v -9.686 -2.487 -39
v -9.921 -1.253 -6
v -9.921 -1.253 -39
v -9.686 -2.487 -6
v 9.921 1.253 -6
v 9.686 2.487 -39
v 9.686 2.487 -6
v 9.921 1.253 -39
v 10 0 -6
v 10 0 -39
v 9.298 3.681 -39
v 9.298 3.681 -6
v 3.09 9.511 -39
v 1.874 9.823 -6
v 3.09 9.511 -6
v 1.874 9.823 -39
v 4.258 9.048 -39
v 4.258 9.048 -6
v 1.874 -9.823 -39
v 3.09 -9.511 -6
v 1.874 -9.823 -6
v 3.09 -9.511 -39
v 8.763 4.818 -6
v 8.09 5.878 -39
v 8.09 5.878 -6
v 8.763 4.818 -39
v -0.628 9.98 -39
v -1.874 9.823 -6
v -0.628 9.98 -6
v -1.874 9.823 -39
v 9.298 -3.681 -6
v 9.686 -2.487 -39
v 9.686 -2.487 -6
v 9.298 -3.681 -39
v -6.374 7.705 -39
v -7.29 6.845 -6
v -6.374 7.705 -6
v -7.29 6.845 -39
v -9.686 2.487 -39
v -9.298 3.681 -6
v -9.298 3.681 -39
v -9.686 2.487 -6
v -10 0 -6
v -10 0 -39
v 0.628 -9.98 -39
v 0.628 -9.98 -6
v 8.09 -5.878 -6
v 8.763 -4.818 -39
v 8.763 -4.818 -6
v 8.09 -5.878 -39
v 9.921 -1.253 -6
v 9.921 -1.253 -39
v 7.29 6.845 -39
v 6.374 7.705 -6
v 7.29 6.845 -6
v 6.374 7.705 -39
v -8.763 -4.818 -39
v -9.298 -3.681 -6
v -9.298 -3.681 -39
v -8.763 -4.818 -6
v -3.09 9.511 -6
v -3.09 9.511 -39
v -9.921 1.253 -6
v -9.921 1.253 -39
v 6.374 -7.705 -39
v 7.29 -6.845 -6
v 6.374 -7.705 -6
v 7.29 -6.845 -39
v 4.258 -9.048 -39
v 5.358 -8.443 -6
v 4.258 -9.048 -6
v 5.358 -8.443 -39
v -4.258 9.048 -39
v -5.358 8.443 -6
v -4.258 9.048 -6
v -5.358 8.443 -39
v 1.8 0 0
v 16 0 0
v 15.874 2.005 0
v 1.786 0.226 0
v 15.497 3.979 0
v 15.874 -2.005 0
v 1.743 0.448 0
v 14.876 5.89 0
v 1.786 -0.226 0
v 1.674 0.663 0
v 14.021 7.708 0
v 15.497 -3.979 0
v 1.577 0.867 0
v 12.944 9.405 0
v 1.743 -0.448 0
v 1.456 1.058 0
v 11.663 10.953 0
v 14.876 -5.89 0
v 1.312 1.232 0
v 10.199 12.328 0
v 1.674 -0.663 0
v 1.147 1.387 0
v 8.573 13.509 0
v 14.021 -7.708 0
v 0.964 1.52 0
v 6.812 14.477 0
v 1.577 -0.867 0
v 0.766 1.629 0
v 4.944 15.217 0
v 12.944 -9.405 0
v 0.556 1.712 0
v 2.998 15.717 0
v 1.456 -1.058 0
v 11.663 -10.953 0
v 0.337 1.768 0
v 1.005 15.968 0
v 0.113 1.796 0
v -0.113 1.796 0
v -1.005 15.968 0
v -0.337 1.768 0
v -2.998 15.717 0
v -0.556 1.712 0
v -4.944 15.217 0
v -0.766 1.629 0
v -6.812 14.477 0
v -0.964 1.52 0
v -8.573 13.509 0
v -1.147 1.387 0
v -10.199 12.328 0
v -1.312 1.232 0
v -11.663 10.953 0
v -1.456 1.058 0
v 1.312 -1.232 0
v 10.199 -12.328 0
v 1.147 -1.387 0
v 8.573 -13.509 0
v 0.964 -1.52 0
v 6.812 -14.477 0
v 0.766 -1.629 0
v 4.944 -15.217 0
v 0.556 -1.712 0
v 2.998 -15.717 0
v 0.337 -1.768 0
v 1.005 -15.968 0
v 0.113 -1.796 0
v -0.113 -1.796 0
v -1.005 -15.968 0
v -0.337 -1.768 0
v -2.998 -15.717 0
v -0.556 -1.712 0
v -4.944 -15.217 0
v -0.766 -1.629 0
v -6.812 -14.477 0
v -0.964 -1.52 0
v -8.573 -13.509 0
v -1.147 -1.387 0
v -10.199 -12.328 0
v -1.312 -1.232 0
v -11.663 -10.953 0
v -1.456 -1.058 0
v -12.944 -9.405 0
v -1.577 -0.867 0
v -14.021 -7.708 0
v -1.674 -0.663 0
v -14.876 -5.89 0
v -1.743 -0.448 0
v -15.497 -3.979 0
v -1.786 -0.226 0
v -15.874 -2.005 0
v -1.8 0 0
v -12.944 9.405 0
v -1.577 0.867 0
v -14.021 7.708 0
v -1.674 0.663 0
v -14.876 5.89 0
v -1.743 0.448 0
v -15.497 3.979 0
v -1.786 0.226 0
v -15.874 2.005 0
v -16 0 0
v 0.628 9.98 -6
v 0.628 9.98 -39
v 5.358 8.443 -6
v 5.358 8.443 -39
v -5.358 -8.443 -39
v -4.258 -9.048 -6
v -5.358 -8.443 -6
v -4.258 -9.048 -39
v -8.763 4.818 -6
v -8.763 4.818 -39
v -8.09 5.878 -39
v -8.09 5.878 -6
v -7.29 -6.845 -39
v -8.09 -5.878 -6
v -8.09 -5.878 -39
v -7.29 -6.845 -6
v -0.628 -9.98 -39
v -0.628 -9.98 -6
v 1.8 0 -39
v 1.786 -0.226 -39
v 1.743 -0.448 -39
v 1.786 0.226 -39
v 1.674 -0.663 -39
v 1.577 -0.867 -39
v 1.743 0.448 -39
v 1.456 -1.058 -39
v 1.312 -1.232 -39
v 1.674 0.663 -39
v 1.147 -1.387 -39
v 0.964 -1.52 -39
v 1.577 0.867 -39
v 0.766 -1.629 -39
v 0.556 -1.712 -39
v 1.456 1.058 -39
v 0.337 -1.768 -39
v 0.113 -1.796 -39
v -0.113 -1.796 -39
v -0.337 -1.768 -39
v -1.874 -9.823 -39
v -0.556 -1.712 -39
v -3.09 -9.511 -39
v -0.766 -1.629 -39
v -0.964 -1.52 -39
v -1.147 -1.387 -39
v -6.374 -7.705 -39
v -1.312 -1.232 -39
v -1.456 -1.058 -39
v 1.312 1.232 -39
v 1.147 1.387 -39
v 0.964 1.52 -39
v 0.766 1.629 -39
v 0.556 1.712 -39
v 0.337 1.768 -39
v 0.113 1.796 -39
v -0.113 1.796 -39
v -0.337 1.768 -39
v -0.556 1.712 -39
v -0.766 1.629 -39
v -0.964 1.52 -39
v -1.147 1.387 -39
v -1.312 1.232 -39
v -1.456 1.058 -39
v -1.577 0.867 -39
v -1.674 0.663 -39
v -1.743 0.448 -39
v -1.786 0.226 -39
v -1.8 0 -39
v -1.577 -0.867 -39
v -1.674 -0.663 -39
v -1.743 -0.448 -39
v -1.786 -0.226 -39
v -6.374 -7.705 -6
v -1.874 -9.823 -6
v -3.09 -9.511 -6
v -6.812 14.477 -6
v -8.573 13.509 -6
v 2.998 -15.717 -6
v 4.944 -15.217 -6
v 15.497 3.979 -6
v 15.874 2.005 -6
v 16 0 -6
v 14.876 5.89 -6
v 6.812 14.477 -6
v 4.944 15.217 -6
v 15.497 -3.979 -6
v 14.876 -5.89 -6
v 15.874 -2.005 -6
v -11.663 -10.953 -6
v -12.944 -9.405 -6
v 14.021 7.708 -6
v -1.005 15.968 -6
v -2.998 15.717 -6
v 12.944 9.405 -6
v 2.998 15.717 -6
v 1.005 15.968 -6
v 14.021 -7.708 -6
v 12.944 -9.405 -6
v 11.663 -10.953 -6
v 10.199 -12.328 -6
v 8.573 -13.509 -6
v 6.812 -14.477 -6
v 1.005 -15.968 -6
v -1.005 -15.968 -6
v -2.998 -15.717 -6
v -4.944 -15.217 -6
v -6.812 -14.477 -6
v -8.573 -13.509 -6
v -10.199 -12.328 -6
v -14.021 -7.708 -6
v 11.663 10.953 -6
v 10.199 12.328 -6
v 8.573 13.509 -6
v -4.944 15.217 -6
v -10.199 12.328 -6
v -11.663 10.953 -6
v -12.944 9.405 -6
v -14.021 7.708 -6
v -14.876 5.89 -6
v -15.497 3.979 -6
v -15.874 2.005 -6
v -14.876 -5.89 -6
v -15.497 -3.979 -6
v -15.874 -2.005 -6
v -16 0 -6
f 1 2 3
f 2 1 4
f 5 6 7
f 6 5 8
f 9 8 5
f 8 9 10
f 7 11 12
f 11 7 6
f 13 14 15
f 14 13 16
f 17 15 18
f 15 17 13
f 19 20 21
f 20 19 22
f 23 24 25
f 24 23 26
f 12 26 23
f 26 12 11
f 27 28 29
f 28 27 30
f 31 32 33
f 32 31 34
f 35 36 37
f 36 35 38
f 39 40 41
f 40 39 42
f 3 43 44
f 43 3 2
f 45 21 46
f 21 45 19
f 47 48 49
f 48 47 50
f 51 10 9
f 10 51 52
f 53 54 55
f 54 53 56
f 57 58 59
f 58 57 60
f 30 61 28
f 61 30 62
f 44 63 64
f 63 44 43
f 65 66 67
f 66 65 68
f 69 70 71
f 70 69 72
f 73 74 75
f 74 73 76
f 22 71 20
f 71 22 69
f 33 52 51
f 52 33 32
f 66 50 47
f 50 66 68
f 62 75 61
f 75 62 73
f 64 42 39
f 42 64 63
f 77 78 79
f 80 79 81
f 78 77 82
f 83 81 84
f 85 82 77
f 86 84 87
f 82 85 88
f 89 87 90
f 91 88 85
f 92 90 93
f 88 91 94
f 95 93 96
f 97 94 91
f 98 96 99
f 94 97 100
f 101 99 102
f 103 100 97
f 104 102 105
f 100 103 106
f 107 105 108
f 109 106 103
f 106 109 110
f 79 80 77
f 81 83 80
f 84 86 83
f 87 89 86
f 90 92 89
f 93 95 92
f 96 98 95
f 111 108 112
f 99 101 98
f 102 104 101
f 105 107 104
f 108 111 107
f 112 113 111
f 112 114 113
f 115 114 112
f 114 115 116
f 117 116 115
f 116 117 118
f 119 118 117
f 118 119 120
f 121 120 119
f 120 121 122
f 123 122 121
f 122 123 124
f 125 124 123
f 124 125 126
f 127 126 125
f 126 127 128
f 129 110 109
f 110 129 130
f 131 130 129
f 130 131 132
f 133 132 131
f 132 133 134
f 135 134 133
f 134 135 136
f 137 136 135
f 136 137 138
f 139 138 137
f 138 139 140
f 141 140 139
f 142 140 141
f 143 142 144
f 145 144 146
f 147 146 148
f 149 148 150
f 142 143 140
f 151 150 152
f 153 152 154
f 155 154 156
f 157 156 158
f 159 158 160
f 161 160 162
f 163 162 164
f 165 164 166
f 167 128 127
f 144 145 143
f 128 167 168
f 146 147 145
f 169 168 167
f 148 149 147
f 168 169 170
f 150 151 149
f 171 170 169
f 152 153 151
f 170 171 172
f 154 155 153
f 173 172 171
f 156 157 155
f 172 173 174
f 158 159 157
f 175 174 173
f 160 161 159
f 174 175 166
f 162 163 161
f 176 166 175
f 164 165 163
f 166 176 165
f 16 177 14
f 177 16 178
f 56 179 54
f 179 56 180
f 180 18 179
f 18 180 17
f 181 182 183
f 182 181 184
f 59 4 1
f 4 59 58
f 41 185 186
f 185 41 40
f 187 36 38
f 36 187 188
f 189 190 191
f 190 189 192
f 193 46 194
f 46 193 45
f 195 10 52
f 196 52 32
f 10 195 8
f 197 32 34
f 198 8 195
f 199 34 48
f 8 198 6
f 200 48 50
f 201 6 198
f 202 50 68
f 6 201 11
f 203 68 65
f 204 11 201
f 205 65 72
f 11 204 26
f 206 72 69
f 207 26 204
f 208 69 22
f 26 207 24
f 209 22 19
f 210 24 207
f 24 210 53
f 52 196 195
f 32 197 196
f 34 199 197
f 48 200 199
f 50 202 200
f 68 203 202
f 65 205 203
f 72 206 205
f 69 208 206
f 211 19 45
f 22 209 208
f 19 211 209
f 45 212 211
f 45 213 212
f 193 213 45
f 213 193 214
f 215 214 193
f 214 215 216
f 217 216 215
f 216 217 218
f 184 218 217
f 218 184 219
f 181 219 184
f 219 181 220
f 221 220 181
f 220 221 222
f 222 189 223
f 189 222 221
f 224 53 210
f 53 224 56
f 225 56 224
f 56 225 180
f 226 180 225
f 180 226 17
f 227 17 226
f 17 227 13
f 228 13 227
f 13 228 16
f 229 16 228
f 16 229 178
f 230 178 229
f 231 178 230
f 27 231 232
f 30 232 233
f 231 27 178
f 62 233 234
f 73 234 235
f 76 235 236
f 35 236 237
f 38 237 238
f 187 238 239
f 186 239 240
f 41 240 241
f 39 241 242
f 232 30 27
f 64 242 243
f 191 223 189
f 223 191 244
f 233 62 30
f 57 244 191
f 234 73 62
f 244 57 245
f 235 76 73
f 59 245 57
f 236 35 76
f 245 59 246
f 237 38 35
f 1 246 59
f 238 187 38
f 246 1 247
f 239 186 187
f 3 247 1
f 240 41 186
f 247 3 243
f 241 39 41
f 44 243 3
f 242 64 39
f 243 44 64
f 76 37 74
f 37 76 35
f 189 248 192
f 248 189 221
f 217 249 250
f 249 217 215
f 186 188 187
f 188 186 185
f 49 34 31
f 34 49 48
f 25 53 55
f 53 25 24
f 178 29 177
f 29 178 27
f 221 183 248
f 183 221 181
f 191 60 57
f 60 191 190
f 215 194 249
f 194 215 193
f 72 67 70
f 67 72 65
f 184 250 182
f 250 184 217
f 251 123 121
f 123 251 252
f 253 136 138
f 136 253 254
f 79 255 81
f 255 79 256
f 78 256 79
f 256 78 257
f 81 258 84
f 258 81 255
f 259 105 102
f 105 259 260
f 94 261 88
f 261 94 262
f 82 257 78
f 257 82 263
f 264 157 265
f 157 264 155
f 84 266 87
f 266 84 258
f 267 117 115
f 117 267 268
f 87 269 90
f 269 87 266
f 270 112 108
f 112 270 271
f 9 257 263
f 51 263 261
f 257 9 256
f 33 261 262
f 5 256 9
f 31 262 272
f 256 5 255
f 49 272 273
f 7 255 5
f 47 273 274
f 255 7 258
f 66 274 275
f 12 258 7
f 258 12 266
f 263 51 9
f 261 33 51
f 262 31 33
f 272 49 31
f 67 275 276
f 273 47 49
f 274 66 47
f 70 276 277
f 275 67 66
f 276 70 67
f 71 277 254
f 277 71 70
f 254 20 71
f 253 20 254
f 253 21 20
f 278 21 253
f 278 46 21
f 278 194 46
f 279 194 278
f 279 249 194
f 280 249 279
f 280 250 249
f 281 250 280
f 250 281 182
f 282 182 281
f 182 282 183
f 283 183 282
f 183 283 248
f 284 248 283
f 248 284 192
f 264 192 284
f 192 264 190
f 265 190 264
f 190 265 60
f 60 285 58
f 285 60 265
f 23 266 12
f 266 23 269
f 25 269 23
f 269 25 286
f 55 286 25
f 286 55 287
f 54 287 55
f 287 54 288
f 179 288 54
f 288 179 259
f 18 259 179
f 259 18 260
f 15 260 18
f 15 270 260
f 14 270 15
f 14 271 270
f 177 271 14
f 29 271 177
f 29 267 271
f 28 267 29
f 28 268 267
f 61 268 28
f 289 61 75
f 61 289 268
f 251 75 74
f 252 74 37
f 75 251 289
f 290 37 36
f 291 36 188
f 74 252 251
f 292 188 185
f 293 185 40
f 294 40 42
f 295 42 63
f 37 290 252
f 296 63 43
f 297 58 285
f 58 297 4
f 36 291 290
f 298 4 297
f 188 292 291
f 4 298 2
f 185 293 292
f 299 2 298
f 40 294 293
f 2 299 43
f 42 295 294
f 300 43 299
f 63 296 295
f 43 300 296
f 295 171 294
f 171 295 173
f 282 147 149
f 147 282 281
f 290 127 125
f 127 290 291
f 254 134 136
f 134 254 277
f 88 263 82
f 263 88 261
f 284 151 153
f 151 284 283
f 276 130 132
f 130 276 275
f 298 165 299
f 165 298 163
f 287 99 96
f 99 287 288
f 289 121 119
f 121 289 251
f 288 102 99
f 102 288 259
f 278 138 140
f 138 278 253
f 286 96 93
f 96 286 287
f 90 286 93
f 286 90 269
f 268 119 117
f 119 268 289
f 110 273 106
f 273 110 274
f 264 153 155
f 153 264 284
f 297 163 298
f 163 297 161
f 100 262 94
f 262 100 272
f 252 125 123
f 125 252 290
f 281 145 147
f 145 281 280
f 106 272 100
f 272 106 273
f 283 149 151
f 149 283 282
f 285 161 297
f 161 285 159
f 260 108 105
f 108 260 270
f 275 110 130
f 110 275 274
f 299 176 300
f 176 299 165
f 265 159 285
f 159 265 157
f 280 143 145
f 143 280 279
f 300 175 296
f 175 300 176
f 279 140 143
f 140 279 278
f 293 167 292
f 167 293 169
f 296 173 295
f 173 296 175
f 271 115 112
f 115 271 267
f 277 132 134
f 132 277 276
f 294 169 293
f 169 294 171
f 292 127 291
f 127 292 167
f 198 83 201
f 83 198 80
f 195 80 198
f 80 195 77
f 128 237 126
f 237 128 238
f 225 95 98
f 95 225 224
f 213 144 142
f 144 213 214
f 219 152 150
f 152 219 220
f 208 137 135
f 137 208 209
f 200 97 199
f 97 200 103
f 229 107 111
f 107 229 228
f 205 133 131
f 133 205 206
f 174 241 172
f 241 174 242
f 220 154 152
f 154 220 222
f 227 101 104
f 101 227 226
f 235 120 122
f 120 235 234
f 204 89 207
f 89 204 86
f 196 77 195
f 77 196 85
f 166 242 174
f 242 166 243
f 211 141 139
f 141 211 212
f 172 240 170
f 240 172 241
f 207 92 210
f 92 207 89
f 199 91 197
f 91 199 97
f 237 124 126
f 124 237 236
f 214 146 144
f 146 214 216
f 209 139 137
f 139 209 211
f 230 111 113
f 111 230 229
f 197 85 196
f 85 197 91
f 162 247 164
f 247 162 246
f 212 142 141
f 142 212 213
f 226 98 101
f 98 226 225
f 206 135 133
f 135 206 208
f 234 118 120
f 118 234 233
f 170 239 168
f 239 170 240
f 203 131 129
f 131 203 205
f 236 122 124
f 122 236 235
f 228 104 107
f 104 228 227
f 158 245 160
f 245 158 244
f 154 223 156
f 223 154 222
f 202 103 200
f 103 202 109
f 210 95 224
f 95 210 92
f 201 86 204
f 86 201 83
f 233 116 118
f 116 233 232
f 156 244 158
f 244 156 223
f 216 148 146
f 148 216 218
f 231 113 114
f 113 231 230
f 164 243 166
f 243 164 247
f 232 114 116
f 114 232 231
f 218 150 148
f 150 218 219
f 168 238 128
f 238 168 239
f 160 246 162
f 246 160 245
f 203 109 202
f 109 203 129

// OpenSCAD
$fn = 50;


difference() {
	union() {
		translate(v = [0, 0, -39.0000000000]) {
			cylinder(h = 39, r = 10.0000000000);
		}
		translate(v = [0, 0, -6.0000000000]) {
			cylinder(h = 6, r = 16.0000000000);
		}
	}
	union() {
		#translate(v = [0, 0, -39]) {
			cylinder(h = 39, r = 1.8000000000);
		}
	}
}
